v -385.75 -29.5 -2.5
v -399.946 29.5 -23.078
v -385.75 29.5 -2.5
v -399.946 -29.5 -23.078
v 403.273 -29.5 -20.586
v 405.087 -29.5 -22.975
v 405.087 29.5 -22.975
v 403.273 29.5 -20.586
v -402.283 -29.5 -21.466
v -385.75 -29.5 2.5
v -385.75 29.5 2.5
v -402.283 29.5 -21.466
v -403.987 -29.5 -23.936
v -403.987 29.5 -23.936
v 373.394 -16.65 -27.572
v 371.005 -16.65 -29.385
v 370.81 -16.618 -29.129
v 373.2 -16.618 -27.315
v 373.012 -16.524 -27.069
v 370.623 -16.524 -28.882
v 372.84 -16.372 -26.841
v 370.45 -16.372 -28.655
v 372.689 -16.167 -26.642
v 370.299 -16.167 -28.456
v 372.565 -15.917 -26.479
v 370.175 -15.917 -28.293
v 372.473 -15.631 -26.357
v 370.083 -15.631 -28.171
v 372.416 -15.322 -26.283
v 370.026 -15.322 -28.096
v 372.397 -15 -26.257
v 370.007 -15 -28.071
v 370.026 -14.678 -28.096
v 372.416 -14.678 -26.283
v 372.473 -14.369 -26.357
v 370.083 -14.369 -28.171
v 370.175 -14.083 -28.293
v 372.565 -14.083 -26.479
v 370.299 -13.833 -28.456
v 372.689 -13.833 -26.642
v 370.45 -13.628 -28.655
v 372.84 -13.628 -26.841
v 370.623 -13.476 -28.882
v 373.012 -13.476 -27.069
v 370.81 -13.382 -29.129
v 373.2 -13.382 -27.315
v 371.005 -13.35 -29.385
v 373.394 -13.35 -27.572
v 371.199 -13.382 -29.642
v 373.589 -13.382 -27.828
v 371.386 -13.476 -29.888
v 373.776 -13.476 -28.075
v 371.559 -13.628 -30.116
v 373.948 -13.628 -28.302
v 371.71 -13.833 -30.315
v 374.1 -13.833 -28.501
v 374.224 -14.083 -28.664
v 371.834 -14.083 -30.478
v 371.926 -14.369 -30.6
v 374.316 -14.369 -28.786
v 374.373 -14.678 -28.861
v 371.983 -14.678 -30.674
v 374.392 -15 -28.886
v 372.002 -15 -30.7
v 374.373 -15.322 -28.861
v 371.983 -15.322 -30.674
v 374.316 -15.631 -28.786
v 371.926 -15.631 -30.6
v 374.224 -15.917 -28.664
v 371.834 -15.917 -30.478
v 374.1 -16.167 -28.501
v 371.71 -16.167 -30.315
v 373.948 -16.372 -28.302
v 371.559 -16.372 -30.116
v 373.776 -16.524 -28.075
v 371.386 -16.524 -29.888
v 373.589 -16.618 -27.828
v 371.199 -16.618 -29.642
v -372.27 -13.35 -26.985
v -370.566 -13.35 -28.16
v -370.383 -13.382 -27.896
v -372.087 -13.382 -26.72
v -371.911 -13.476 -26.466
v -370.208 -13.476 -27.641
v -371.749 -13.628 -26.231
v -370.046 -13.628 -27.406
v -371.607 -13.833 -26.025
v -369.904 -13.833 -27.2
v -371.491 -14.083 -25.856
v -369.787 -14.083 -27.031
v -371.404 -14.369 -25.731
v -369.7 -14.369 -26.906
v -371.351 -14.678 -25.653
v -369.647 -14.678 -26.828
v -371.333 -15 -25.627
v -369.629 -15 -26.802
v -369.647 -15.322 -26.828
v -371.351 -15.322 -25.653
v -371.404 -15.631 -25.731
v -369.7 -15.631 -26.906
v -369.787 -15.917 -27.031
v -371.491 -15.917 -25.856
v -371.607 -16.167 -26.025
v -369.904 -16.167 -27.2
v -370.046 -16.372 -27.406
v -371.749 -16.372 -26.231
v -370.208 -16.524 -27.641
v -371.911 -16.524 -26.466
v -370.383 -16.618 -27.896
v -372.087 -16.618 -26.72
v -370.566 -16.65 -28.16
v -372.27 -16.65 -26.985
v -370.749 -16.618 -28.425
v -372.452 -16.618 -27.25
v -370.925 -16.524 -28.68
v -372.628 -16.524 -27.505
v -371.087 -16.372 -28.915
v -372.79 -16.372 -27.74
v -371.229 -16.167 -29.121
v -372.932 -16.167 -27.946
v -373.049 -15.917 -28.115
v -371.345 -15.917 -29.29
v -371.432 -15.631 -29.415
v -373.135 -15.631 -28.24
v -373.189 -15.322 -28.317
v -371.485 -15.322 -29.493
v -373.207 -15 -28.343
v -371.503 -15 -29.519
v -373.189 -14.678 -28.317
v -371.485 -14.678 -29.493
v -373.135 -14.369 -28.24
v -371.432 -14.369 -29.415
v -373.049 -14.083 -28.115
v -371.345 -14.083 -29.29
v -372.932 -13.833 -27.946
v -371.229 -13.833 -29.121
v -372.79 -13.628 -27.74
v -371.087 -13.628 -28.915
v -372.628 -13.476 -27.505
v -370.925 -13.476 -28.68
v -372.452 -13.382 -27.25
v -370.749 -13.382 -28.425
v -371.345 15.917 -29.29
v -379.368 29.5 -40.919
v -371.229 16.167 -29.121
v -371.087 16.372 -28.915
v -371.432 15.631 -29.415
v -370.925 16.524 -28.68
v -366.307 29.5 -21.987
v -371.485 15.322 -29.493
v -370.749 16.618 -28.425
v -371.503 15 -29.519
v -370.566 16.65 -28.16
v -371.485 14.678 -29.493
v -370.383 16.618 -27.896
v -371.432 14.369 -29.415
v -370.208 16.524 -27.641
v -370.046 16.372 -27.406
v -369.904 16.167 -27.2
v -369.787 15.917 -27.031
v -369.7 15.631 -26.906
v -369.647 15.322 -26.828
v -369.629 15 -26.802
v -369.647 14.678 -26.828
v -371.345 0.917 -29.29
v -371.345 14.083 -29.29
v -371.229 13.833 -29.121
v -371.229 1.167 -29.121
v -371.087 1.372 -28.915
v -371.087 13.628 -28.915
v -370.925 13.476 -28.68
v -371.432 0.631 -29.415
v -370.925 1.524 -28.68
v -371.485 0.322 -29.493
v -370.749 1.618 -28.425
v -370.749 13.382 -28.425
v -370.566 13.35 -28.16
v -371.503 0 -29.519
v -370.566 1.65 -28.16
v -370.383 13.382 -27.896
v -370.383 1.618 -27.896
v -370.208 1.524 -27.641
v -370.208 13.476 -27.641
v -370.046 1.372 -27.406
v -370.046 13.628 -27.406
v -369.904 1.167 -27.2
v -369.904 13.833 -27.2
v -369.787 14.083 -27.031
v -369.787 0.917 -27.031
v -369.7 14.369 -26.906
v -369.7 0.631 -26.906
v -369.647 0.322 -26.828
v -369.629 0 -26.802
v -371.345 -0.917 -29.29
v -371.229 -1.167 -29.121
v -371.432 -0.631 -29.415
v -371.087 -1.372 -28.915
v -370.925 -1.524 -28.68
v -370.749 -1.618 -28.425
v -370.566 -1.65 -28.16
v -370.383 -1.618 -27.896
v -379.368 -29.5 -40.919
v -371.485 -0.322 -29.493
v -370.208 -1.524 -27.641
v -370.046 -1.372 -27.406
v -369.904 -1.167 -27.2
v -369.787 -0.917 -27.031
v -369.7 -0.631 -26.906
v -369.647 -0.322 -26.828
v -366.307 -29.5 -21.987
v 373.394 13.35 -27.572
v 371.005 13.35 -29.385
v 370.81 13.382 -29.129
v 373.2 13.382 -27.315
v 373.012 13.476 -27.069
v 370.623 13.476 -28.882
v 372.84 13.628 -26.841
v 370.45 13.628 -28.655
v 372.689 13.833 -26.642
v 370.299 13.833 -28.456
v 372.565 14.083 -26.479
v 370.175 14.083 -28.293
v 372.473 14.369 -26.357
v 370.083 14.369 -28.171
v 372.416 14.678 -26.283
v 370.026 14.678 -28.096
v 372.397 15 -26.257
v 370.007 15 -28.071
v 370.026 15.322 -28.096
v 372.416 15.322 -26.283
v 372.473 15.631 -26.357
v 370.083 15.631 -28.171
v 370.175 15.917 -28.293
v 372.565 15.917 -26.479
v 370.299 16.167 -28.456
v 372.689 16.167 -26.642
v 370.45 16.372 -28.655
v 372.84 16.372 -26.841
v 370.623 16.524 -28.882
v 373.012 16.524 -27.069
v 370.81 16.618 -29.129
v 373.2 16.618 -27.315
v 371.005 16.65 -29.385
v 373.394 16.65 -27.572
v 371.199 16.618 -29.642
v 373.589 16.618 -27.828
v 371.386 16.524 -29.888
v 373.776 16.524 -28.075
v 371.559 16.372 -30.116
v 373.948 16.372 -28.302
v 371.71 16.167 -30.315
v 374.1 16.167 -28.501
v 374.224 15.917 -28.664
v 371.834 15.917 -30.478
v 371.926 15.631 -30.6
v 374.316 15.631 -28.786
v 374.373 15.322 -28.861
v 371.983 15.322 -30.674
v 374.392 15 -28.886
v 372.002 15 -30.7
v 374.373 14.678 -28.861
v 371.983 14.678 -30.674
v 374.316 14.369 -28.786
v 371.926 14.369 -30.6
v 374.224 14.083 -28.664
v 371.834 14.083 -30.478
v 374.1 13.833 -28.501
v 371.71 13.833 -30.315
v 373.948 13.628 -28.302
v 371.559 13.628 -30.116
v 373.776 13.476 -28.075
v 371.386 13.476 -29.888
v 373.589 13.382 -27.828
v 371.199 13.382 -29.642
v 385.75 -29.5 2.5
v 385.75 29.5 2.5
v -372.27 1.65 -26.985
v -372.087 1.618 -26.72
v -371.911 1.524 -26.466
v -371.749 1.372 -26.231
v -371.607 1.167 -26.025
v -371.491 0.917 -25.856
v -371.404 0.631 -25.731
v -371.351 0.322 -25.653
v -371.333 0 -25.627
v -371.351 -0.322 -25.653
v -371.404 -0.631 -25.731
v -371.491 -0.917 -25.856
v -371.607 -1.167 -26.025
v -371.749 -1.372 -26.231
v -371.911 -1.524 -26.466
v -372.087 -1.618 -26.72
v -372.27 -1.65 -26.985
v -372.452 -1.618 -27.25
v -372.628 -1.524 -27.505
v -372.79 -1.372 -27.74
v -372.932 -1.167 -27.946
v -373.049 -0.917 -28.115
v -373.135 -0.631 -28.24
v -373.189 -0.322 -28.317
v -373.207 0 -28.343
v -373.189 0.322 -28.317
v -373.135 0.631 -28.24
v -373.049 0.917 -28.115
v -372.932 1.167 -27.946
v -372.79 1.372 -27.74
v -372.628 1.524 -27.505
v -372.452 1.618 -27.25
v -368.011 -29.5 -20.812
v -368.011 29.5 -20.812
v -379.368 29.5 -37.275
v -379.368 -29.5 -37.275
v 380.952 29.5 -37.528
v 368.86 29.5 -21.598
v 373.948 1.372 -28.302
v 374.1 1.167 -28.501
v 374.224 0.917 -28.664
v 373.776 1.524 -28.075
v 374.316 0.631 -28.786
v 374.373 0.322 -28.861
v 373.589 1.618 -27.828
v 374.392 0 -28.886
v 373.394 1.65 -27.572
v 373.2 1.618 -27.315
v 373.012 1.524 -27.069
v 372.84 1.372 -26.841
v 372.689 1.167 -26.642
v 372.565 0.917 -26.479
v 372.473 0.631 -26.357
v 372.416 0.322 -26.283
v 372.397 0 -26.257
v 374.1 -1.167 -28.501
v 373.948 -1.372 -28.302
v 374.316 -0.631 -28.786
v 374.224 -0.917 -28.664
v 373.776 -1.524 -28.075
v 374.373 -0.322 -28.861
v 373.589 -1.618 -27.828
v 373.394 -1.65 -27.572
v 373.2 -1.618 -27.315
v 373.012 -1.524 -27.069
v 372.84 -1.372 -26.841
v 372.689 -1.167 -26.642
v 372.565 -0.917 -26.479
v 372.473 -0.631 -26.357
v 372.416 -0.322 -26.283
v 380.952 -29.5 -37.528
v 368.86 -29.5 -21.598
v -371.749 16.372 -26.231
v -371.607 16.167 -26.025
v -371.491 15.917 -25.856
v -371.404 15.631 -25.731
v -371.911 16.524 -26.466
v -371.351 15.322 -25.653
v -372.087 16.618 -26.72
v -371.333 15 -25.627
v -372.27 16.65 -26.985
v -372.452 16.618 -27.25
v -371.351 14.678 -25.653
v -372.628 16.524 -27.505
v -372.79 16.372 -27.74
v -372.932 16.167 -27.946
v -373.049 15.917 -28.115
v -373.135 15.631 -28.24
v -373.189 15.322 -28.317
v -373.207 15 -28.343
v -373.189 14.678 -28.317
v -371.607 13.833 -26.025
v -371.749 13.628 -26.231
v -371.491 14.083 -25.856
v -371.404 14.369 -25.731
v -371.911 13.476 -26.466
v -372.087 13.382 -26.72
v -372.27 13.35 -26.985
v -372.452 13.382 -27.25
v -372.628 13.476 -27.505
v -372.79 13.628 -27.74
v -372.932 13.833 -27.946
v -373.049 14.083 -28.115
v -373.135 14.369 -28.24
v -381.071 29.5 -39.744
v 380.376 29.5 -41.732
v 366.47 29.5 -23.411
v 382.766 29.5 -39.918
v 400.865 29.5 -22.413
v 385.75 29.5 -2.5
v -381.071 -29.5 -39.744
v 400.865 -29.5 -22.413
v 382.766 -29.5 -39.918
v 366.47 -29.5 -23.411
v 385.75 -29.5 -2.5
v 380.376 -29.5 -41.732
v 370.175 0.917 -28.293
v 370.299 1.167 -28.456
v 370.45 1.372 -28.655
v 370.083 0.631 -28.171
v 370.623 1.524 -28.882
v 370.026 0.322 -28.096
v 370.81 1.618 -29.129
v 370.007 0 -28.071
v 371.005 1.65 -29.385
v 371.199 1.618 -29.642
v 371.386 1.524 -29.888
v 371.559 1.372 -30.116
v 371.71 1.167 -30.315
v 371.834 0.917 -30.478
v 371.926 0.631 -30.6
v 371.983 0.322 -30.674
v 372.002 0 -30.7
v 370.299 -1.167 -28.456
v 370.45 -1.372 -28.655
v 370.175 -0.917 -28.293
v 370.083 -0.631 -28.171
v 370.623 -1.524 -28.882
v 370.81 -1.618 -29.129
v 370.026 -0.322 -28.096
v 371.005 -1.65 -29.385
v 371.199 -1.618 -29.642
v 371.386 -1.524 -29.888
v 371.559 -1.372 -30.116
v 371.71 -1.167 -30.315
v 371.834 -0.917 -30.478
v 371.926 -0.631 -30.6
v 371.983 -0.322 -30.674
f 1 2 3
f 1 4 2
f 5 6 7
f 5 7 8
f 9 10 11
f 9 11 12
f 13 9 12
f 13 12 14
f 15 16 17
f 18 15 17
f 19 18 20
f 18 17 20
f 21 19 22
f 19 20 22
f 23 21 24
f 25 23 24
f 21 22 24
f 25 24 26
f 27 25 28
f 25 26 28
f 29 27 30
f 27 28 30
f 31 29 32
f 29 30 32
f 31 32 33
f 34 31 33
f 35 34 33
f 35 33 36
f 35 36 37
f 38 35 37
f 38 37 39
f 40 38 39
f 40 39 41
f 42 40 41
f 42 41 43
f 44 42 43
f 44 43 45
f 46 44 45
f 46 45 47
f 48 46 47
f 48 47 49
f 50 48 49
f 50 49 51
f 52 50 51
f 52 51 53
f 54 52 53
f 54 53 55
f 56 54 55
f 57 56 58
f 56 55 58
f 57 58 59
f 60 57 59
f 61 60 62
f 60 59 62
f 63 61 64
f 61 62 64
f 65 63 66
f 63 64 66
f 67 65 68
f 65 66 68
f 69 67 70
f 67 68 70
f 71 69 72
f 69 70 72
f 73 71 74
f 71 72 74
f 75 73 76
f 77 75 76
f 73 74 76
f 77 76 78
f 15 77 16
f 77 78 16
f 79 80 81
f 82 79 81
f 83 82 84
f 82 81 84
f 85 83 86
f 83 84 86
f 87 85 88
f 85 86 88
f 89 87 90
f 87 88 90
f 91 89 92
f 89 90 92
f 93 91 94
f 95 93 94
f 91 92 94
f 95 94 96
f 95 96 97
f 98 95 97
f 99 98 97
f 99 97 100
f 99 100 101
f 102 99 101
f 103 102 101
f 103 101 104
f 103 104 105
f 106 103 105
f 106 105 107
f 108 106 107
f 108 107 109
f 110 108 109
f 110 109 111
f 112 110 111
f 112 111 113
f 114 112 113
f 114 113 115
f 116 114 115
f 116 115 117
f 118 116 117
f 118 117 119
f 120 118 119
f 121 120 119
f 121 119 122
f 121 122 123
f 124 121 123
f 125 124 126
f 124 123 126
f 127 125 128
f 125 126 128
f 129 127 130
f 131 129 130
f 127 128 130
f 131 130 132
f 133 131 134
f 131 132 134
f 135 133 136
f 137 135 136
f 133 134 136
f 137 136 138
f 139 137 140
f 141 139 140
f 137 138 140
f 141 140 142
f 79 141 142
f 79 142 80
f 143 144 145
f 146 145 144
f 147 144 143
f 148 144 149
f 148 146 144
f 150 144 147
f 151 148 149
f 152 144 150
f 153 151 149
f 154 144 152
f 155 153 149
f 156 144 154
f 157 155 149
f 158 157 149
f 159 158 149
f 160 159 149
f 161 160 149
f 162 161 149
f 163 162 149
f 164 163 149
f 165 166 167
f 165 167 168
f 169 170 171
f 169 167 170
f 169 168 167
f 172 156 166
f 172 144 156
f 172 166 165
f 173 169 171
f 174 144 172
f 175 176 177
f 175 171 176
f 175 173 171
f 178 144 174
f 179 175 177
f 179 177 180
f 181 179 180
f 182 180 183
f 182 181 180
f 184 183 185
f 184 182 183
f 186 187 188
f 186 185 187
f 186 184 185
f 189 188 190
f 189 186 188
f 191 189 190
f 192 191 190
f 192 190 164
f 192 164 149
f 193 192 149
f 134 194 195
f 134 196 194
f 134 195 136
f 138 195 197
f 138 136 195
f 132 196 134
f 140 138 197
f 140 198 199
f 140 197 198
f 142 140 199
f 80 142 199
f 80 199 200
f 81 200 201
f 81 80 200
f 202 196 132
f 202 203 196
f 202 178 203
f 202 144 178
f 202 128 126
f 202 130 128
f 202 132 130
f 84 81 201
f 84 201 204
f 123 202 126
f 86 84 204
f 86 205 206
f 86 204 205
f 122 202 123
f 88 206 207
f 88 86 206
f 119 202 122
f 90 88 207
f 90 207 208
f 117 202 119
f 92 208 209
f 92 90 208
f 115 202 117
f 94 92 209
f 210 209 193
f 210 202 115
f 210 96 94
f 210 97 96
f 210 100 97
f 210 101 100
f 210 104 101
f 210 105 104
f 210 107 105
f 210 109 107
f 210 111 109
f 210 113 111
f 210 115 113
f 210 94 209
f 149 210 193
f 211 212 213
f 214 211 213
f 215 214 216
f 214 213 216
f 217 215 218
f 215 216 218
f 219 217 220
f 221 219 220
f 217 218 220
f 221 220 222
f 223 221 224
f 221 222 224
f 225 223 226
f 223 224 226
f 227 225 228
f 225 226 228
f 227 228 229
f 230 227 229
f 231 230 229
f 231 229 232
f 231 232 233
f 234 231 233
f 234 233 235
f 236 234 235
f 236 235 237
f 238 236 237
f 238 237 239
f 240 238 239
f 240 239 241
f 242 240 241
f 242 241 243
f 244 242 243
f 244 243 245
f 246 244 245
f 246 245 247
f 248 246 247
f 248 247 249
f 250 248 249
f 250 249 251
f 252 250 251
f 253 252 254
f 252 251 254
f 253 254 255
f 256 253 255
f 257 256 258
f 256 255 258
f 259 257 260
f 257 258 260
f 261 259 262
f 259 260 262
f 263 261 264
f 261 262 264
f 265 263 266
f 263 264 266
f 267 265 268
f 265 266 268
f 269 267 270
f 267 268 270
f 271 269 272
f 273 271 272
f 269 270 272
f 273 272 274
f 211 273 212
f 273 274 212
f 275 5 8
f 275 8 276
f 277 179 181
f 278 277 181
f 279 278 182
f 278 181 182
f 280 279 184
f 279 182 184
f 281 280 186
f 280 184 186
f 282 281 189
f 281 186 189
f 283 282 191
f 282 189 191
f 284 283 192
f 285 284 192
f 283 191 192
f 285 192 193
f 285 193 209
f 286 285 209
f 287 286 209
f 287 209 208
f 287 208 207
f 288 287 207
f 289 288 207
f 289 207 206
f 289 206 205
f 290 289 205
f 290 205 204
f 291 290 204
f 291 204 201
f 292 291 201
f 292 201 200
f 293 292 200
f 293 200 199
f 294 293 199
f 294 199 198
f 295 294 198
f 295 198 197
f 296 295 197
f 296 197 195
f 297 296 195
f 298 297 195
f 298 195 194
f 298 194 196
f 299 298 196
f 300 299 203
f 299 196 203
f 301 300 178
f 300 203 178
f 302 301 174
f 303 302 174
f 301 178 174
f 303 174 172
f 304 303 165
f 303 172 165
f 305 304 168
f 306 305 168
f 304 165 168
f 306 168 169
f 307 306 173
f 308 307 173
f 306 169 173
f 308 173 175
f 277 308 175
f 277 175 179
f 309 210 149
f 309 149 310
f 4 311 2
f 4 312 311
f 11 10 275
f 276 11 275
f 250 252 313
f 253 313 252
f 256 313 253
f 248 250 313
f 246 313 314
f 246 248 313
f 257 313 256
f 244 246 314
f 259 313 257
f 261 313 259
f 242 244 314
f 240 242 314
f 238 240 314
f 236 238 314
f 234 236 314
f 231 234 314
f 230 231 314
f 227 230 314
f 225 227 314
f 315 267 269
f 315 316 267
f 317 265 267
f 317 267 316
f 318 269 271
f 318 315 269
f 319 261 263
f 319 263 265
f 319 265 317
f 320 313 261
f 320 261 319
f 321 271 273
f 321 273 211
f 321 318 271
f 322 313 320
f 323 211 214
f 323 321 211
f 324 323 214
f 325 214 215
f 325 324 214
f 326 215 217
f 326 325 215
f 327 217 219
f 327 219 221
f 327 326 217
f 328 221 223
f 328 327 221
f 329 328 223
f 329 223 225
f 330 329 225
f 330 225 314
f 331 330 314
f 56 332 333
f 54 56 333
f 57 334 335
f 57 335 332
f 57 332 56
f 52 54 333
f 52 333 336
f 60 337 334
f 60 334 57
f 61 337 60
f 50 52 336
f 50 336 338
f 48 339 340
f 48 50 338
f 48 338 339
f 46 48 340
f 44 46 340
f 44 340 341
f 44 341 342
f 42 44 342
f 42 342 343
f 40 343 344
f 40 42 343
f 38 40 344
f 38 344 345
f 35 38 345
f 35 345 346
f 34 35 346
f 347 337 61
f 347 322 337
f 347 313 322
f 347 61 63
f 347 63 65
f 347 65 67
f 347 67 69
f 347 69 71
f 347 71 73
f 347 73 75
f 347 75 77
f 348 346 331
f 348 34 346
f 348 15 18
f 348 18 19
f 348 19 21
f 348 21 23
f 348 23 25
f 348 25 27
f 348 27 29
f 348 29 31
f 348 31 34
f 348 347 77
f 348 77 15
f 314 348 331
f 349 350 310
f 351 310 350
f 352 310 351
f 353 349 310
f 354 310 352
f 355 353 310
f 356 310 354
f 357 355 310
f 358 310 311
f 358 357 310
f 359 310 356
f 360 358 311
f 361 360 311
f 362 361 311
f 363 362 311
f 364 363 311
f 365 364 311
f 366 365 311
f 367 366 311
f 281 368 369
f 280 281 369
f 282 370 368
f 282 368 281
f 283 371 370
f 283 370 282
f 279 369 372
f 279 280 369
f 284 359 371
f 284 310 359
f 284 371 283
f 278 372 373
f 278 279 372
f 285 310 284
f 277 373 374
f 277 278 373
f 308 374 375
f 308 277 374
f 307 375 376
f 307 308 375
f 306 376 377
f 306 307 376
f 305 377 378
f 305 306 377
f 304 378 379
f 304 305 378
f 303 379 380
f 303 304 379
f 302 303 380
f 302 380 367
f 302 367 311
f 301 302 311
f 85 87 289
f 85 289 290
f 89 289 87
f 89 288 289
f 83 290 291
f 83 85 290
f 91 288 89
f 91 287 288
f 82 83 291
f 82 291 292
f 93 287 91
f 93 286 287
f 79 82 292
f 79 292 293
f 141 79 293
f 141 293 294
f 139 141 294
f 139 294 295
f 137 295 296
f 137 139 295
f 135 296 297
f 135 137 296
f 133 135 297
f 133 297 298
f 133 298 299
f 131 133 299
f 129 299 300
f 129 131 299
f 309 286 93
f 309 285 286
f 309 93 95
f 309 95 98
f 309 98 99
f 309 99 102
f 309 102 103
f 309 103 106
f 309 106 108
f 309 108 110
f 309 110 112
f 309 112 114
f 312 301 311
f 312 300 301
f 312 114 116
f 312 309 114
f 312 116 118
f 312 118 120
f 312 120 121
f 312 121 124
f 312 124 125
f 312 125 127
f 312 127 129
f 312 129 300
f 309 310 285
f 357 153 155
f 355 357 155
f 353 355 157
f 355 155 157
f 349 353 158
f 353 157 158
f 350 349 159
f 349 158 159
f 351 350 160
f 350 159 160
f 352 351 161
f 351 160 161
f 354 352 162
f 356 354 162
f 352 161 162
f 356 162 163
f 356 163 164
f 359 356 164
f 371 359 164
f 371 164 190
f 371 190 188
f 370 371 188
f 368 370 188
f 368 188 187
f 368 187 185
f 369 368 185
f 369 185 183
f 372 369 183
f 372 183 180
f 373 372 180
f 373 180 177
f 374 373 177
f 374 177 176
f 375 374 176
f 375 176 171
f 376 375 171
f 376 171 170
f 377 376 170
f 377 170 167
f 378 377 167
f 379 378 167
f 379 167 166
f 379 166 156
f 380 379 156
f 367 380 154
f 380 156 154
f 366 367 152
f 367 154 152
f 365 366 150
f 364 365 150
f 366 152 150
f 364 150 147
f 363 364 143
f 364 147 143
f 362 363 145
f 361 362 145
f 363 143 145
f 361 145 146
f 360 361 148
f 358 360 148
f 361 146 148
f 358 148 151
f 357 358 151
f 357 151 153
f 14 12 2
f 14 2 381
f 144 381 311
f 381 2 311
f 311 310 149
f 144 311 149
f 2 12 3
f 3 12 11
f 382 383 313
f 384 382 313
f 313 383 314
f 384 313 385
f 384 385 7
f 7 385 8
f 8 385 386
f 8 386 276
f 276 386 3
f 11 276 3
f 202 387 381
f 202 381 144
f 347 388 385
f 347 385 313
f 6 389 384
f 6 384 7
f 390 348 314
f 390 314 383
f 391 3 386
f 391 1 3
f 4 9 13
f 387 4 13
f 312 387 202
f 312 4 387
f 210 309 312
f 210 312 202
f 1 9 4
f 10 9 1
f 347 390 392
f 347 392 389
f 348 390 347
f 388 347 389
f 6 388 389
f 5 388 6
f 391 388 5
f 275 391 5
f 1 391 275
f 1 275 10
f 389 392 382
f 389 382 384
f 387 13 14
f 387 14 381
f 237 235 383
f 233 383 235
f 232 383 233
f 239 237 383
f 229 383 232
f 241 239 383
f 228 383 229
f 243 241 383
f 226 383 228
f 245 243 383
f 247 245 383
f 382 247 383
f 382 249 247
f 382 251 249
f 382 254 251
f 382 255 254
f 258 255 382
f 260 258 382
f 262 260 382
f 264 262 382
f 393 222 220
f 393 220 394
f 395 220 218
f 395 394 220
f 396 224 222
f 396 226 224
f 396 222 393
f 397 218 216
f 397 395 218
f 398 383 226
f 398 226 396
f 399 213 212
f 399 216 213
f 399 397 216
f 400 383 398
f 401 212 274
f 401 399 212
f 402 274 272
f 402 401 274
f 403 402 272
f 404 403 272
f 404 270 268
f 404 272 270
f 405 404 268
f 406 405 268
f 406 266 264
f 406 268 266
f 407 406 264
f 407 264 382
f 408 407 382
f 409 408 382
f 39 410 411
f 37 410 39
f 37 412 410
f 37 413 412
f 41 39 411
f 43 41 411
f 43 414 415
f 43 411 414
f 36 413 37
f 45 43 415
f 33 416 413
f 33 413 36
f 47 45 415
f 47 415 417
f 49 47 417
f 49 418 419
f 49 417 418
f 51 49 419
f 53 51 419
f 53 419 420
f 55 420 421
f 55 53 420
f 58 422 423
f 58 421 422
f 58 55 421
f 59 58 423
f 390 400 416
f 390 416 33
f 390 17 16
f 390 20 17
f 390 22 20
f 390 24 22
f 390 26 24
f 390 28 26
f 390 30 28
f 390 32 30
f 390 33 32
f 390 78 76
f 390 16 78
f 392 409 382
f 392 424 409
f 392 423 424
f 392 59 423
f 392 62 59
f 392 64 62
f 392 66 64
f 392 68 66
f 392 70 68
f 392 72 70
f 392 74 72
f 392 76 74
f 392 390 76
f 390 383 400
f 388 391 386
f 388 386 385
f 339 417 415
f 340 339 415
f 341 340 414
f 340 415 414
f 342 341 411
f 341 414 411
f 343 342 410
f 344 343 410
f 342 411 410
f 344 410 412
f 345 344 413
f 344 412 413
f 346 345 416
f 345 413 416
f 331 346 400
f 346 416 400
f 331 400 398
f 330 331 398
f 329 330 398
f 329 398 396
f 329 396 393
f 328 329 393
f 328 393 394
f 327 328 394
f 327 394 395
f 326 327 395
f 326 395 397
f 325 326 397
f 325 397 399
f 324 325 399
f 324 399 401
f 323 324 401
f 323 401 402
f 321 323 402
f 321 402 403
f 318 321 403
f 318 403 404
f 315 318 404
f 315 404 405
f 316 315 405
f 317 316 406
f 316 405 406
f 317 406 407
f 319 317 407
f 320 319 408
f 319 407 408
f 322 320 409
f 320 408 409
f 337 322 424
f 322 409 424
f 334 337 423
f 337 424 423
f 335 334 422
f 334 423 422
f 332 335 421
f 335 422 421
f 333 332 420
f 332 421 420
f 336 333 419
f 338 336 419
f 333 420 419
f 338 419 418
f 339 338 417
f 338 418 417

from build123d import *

# Parameters (mm, degrees)
F0_W     = 771.5
F0_H     = 5
F1_DEPTH = 29.5
F2_R     = 1.65
F3_DEPTH = 3
F4_R     = 1.65
F5_DEPTH = 25


with BuildPart() as f1:
    # F0 (on Front) → F1 (new body, symmetric)
    with BuildSketch(Plane.XZ):
        Rectangle(F0_W, F0_H)
        Polygon((403.2728842886, -20.5855475021), (385.75, 2.5), (385.75, -2.5), (400.8649778716, -22.4132479506), align=None)
        Polygon((-385.75, -2.5), (-385.75, 2.5), (-402.2831578173, -21.4661766194), (-399.9460936263, -23.0784092134), align=None)
        Polygon((405.0866816331, -22.9751372562), (403.2728842886, -20.5855475021), (400.8649778716, -22.4132479506), (380.951729921, -37.5282258222), (382.7655272655, -39.9178155762), align=None)
        Polygon((-399.9460936263, -23.0784092134), (-402.2831578173, -21.4661766194), (-403.9866890525, -23.935585725), (-381.0712156481, -39.7439119453), (-379.367684413, -37.2745028397), align=None)
        Polygon((382.7655272655, -39.9178155762), (380.951729921, -37.5282258222), (368.8597476237, -21.5976274617), (366.4701578696, -23.4114248063), (380.3759375115, -41.7316129208), align=None)
        Polygon((-368.0108095119, -20.811775469), (-379.367684413, -37.2745028397), (-381.0712156481, -39.7439119453), (-379.367684413, -40.9190994274), (-366.3072782767, -21.9869629511), align=None)
    extrude(amount=F1_DEPTH, both=True)

    # F2 (on face) → F3 (cut)
    with BuildSketch(Plane(origin=(-237.9157828305, 0, 164.1271049294), x_dir=(0, 1, 0), z_dir=(0.8231363685, 0, -0.5678437451))):
        with Locations((-15, -233.6035655756)):
            Circle(F2_R)
        with Locations((0, -233.6035655756)):
            Circle(F2_R)
        with Locations((15, -233.6035655756)):
            Circle(F2_R)
    extrude(amount=-F3_DEPTH, mode=Mode.SUBTRACT)

    # F4 (on face) → F5 (cut)
    with BuildSketch(Plane(origin=(221.236119488, 0, 167.9273546307), x_dir=(0, -1, 0), z_dir=(-0.796529918, 0, -0.6045991149))):
        with Locations((0, -247.7154333532)):
            Circle(F4_R)
        with Locations((-15, -247.7154333532)):
            Circle(F4_R)
        with Locations((15, -247.7154333532)):
            Circle(F4_R)
    extrude(amount=-F5_DEPTH, mode=Mode.SUBTRACT)


solid = f1.part
